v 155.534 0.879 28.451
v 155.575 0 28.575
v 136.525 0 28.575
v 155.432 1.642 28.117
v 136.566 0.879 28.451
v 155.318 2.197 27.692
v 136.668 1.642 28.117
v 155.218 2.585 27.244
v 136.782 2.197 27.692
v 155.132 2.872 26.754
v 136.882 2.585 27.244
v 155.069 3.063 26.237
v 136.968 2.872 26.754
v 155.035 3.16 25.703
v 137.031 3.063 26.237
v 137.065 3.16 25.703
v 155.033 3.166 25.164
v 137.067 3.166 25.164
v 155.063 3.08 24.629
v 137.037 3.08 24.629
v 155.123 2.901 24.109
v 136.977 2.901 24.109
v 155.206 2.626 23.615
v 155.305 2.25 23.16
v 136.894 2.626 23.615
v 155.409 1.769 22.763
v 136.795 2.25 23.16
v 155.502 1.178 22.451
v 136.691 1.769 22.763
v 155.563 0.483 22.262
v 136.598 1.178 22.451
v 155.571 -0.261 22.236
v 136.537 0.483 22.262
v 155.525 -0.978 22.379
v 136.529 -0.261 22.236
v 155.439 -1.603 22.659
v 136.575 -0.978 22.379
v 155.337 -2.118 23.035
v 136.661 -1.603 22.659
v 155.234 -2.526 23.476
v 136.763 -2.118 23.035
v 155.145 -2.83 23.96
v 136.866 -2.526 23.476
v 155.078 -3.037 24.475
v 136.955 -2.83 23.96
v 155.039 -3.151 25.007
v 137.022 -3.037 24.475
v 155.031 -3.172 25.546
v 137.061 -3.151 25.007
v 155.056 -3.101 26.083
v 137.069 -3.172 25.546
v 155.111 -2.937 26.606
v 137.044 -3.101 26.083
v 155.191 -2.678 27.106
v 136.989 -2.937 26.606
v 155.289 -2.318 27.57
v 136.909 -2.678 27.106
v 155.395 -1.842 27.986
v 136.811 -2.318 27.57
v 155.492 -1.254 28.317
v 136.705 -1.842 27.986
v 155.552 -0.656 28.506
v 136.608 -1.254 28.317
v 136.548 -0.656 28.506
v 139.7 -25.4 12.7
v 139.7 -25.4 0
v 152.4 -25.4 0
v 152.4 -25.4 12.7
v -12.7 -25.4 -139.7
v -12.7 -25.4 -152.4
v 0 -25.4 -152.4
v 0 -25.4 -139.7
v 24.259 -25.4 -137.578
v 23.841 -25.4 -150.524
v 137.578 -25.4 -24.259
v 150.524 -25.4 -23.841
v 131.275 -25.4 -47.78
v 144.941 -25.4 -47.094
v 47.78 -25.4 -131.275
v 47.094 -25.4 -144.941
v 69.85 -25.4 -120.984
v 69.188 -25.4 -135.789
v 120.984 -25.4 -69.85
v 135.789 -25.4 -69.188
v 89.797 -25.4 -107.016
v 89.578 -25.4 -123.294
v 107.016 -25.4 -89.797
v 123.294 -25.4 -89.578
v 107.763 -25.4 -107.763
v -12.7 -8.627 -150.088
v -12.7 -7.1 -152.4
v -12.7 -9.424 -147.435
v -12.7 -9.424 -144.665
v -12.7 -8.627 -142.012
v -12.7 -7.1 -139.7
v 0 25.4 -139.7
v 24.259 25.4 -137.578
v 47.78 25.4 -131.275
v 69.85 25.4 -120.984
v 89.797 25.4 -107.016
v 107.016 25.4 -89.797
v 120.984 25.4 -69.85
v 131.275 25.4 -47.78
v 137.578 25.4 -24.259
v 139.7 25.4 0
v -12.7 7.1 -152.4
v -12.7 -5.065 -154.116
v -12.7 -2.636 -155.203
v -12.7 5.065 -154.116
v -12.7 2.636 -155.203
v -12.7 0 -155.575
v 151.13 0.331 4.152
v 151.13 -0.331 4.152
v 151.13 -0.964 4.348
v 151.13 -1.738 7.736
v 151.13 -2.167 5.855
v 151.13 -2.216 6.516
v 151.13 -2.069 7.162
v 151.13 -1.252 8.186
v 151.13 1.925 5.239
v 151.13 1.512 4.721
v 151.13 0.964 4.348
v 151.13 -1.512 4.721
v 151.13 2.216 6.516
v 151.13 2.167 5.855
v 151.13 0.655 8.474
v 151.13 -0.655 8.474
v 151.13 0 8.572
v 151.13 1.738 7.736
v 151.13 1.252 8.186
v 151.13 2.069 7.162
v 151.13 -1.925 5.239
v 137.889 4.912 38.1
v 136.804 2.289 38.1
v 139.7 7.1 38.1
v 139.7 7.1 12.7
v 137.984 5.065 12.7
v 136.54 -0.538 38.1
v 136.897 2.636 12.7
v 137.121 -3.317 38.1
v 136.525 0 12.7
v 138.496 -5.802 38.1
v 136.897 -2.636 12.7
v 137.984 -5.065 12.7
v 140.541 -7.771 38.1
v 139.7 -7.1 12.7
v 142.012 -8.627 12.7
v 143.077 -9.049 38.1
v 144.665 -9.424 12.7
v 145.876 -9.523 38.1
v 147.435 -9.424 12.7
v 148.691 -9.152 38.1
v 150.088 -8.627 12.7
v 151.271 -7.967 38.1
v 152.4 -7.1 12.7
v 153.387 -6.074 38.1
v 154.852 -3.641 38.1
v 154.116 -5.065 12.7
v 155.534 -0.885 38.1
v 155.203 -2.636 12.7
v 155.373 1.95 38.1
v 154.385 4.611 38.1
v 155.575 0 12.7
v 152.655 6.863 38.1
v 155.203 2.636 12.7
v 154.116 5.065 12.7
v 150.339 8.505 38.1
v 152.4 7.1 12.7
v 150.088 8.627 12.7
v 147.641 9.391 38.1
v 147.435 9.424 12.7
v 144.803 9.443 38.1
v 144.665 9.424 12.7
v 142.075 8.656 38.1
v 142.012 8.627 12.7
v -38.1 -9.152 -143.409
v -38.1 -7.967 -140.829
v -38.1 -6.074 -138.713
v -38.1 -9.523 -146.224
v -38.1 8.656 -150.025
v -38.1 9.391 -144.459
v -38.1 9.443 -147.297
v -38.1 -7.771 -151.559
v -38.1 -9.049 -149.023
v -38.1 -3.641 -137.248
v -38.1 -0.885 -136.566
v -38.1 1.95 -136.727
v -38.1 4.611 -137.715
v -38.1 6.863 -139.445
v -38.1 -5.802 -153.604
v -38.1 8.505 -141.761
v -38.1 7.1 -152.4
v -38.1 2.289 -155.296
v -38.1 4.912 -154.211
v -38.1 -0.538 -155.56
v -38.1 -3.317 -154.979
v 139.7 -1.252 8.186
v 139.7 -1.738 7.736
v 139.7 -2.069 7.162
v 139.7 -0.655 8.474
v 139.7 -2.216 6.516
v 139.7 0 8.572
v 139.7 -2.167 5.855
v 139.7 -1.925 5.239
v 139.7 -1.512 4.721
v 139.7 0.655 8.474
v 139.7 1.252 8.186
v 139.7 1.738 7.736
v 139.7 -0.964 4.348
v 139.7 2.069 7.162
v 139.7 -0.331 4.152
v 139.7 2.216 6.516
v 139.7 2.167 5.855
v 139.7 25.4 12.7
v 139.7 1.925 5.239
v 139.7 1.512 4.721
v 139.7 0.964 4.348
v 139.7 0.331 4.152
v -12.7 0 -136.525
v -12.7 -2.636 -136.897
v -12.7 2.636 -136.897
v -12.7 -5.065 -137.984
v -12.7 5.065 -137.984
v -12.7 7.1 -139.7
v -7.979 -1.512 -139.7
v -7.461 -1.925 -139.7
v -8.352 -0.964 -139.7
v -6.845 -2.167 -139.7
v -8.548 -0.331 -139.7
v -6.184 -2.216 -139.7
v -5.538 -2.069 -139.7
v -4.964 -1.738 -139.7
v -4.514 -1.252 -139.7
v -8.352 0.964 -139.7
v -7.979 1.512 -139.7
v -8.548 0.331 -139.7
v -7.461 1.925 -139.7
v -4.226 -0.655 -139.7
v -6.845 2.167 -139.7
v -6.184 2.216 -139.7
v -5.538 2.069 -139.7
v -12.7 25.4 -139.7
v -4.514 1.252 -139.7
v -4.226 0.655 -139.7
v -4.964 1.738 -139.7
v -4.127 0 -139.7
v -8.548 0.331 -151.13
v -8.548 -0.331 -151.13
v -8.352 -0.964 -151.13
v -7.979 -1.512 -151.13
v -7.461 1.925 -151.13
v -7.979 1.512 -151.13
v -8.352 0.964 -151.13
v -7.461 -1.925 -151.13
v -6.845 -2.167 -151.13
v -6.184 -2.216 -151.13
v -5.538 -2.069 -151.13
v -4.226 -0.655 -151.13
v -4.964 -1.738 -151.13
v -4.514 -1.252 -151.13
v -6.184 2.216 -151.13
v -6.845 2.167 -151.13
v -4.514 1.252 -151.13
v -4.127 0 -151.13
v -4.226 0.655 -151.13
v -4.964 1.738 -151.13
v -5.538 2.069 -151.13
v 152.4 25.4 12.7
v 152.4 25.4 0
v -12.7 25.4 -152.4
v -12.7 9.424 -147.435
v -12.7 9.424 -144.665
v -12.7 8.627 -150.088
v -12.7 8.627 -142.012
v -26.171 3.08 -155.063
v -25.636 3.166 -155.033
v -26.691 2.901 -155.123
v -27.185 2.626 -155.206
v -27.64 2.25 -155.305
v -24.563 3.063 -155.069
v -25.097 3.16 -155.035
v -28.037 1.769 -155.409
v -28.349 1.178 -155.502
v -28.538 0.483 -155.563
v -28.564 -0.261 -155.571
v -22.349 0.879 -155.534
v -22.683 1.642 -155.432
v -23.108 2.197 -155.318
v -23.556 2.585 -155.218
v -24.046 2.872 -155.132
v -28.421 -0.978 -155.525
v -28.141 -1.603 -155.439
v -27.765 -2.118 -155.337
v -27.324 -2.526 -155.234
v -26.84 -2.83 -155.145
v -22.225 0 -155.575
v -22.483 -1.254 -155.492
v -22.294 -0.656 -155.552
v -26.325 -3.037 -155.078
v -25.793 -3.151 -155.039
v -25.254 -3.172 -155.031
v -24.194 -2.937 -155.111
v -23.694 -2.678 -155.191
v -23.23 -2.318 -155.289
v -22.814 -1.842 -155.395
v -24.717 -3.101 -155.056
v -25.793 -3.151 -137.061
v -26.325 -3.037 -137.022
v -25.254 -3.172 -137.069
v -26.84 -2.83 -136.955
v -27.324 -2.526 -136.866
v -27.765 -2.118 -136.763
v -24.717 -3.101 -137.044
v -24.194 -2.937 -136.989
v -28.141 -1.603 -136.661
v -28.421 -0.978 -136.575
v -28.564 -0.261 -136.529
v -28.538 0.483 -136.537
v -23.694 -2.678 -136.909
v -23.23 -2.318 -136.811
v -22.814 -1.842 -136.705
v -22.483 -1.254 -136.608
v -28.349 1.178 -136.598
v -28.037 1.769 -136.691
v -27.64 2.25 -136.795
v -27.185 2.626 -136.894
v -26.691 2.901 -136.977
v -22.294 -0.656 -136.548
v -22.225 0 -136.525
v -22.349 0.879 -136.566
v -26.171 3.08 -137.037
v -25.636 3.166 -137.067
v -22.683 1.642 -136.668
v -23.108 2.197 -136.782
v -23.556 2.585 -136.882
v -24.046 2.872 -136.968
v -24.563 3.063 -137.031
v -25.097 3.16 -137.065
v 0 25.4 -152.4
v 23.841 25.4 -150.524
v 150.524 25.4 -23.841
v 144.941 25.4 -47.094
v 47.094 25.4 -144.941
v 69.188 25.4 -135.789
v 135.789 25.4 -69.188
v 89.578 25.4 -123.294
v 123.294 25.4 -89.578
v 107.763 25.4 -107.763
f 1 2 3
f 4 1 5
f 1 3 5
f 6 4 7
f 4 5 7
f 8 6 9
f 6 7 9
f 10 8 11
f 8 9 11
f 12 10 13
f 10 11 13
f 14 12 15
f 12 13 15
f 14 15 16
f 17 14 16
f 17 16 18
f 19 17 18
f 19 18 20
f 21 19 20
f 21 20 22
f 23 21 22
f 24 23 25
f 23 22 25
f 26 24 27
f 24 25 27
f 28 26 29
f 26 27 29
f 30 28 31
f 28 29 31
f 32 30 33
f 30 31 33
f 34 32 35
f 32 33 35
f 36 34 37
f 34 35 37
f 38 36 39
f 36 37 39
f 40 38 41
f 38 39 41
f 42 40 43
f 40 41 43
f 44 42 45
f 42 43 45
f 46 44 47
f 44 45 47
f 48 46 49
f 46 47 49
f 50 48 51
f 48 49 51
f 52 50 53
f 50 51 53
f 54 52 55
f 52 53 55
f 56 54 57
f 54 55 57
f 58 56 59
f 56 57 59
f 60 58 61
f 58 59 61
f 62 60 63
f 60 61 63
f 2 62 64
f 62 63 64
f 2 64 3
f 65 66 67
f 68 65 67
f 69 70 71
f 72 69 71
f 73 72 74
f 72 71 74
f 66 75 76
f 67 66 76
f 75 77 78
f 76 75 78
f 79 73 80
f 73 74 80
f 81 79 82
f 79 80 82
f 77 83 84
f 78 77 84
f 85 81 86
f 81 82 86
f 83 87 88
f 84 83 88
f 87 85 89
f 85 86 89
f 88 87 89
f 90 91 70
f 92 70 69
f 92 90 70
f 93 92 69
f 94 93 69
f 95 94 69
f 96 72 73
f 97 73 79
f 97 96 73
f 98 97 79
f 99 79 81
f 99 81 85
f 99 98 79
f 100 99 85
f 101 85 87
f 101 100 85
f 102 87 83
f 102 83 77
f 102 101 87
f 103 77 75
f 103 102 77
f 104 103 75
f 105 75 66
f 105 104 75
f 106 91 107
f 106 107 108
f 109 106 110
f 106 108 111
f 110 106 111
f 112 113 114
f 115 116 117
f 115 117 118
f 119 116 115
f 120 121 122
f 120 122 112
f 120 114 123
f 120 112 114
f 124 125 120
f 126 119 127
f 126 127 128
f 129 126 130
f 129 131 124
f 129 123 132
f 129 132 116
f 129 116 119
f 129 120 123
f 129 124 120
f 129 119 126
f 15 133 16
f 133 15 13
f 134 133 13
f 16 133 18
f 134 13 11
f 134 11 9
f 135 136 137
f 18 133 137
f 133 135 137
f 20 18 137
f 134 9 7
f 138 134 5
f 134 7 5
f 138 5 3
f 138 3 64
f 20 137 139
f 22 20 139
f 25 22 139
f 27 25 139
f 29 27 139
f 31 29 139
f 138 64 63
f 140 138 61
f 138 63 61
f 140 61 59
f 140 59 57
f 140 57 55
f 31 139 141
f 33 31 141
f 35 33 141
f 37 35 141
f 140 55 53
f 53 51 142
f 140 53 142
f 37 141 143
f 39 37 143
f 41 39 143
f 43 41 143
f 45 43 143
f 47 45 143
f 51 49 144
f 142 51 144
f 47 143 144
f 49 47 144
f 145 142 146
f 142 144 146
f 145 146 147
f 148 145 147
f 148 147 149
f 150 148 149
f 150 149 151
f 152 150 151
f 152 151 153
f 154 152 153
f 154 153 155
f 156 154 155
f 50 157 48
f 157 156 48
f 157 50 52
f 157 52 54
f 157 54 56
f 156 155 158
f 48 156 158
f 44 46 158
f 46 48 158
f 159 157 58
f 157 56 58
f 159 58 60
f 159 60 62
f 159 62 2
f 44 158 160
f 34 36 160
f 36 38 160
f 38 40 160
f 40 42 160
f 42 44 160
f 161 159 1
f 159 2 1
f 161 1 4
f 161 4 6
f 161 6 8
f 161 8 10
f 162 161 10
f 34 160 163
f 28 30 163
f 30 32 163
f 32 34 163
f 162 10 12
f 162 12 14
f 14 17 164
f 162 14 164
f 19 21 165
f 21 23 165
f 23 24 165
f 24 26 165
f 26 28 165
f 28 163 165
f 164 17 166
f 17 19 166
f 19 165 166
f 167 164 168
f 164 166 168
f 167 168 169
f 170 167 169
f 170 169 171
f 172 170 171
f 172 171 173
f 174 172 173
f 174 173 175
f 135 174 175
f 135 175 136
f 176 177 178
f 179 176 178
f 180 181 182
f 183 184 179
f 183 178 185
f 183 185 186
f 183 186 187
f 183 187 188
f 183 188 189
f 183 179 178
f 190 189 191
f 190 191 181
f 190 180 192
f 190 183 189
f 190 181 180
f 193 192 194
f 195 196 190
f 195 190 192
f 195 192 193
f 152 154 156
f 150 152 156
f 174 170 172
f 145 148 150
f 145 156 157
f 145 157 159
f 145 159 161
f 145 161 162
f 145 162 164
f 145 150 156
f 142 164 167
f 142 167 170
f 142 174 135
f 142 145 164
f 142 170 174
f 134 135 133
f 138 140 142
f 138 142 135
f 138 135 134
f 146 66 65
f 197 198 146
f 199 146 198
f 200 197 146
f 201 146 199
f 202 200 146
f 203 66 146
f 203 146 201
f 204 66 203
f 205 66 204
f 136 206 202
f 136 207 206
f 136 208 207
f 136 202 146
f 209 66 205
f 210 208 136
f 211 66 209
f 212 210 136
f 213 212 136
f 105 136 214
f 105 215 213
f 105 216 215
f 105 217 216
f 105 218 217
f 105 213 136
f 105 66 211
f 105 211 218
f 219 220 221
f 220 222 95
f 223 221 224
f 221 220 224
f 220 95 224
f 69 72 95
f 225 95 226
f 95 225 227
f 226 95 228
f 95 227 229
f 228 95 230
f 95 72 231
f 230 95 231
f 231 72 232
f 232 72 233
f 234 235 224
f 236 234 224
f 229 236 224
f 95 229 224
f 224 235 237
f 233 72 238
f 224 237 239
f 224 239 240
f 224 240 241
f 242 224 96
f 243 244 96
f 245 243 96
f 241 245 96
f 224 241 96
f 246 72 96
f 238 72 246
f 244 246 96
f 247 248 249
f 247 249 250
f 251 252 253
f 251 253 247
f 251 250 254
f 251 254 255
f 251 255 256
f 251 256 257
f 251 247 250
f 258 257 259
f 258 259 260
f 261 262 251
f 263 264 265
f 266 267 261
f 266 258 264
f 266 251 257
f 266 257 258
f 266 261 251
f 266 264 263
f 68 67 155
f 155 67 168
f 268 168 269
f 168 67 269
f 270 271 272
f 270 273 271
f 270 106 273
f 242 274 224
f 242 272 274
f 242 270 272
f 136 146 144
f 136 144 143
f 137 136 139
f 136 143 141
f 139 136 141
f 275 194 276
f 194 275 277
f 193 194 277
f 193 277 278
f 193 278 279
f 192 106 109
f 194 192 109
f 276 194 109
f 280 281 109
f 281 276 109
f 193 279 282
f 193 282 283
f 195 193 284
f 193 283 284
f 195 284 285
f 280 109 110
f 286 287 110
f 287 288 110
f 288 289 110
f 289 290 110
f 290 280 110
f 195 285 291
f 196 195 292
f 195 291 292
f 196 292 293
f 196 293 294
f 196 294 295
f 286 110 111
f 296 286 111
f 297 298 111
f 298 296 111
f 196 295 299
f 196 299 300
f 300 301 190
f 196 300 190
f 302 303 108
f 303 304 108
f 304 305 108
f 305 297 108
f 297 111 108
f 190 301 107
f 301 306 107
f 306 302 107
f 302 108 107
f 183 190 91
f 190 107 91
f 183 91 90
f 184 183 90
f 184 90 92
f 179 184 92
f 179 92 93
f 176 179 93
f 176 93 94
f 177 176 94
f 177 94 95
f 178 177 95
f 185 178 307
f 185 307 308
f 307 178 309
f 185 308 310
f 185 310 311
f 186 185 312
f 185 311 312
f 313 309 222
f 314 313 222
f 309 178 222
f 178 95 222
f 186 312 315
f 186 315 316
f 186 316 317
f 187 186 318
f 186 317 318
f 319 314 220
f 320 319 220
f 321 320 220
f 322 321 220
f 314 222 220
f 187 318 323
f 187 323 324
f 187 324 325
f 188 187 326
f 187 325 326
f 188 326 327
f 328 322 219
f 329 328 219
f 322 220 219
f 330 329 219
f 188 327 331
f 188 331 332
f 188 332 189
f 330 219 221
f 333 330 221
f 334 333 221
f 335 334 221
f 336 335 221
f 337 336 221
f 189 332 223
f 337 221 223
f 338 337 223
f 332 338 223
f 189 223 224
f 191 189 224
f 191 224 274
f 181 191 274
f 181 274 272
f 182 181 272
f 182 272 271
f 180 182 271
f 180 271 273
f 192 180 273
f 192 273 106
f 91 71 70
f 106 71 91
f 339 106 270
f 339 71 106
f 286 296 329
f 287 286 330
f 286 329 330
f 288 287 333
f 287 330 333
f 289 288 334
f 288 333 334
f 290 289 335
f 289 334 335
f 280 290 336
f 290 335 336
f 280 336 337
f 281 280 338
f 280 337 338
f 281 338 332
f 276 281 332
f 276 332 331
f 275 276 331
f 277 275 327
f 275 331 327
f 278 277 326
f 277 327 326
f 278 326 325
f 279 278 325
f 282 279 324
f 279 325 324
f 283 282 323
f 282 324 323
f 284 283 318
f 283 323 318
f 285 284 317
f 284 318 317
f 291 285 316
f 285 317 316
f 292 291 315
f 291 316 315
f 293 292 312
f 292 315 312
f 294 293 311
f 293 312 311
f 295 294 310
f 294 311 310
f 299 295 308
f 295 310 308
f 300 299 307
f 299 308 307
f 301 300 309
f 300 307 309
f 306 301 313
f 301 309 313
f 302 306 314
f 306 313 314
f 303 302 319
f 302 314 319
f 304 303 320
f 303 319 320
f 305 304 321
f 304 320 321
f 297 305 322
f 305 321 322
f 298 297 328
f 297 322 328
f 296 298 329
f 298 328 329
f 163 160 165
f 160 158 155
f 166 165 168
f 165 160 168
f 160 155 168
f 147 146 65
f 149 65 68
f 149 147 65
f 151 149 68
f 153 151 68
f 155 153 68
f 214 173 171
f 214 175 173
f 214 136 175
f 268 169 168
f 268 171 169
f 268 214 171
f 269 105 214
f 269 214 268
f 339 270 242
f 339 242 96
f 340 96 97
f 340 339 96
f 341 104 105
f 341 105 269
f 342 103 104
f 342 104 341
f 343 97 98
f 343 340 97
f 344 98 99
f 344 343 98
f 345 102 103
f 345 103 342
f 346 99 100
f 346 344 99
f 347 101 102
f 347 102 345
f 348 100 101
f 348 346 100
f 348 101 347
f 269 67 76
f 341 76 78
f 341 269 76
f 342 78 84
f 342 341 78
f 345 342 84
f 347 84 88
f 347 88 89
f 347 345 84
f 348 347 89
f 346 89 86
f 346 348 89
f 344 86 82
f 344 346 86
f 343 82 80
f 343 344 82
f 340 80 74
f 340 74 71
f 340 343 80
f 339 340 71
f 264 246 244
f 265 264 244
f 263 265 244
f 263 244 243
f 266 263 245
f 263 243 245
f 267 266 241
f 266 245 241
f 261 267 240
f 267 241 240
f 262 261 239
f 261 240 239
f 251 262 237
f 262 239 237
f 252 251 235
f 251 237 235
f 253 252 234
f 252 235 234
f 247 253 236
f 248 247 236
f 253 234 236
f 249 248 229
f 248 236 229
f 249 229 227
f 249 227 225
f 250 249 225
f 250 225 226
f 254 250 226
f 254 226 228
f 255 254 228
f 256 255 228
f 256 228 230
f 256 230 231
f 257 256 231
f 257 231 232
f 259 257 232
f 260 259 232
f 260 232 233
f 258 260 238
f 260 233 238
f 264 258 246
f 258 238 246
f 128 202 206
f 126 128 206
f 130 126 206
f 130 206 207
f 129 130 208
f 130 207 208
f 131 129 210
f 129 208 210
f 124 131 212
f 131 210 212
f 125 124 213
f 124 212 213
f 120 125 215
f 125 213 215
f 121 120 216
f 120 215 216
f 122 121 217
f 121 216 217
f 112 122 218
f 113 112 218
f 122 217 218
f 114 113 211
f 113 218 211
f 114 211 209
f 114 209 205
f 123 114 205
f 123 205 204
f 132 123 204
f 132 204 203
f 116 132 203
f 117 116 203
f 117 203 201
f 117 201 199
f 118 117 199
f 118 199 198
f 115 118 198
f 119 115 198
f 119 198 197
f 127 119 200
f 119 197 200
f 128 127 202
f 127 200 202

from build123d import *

# Parameters (mm, degrees)
BOSS_EXTRUDE1_DEPTH = 25.4
SKETCH2_W           = 12.7
SKETCH2_H           = 50.8
BOSS_EXTRUDE2_DEPTH = 12.7
SKETCH3_W           = 12.7
SKETCH3_H           = 50.8
BOSS_EXTRUDE3_DEPTH = 12.7
SKETCH4_R           = 9.525
BOSS_EXTRUDE4_DEPTH = 25.4
SKETCH5_R           = 3.175
CUT_EXTRUDE1_DEPTH  = 19.05
SKETCH6_R           = 9.525
BOSS_EXTRUDE5_DEPTH = 25.4
SKETCH7_R           = 3.175
CUT_EXTRUDE2_DEPTH  = 19.05
SKETCH8_R           = 2.2225
CUT_EXTRUDE3_DEPTH  = 11.43
SKETCH9_R           = 2.2225
CUT_EXTRUDE4_DEPTH  = 11.43


with BuildPart() as part:
    # Sketch1 → Boss-Extrude1 (new, symmetric)
    with BuildSketch(Plane(origin=(0, 0, 0), x_dir=(1, 0, 0), z_dir=(0, 1, 0))):
        with BuildLine():
            Line((0, 152.4), (0, 139.7))
            ThreePointArc((0, 139.7), (98.782817332, 98.782817332), (139.7, 0))
            Line((139.7, 0), (152.4, 0))
            ThreePointArc((152.4, 0), (107.763073453, 107.763073453), (0, 152.4))
        make_face()
    extrude(amount=BOSS_EXTRUDE1_DEPTH, both=True)

    # Sketch2 → Boss-Extrude2 (add)
    with BuildSketch(Plane.ZY):
        with Locations((-146.05, 0)):
            Rectangle(SKETCH2_W, SKETCH2_H)
    extrude(amount=BOSS_EXTRUDE2_DEPTH)

    # Sketch3 → Boss-Extrude3 (add)
    with BuildSketch(Plane.XY):
        with Locations((146.05, 0)):
            Rectangle(SKETCH3_W, SKETCH3_H)
    extrude(amount=BOSS_EXTRUDE3_DEPTH)

    # Sketch4 → Boss-Extrude4 (add)
    with BuildSketch(Plane.ZY.offset(12.7)):
        with Locations(Location((-146.05, 0, 0), (0, 0, 131.810314896))):
            Circle(SKETCH4_R)
    extrude(amount=BOSS_EXTRUDE4_DEPTH)

    # Sketch5 → Cut-Extrude1 (cut, symmetric)
    with BuildSketch(Plane.XY.offset(-139.7)):
        with Locations((-25.4, 0)):
            Circle(SKETCH5_R)
    extrude(amount=CUT_EXTRUDE1_DEPTH, both=True, mode=Mode.SUBTRACT)

    # Sketch6 → Boss-Extrude5 (add)
    with BuildSketch(Plane.XY.offset(12.7)):
        with Locations(Location((146.05, 0, 0), (0, 0, 131.810314896))):
            Circle(SKETCH6_R)
    extrude(amount=BOSS_EXTRUDE5_DEPTH)

    # Sketch7 → Cut-Extrude2 (cut, symmetric)
    with BuildSketch(Plane.ZY.offset(-139.7)):
        with Locations((25.4, 0)):
            Circle(SKETCH7_R)
    extrude(amount=CUT_EXTRUDE2_DEPTH, both=True, mode=Mode.SUBTRACT)

    # Sketch8 → Cut-Extrude3 (cut)
    with BuildSketch(Plane.XY.offset(-139.7)):
        with Locations((-6.35, 0)):
            Circle(SKETCH8_R)
    extrude(amount=-CUT_EXTRUDE3_DEPTH, mode=Mode.SUBTRACT)

    # Sketch9 → Cut-Extrude4 (cut)
    with BuildSketch(Plane.ZY.offset(-139.7)):
        with Locations((6.35, 0)):
            Circle(SKETCH9_R)
    extrude(amount=-CUT_EXTRUDE4_DEPTH, mode=Mode.SUBTRACT)


solid = part.part
